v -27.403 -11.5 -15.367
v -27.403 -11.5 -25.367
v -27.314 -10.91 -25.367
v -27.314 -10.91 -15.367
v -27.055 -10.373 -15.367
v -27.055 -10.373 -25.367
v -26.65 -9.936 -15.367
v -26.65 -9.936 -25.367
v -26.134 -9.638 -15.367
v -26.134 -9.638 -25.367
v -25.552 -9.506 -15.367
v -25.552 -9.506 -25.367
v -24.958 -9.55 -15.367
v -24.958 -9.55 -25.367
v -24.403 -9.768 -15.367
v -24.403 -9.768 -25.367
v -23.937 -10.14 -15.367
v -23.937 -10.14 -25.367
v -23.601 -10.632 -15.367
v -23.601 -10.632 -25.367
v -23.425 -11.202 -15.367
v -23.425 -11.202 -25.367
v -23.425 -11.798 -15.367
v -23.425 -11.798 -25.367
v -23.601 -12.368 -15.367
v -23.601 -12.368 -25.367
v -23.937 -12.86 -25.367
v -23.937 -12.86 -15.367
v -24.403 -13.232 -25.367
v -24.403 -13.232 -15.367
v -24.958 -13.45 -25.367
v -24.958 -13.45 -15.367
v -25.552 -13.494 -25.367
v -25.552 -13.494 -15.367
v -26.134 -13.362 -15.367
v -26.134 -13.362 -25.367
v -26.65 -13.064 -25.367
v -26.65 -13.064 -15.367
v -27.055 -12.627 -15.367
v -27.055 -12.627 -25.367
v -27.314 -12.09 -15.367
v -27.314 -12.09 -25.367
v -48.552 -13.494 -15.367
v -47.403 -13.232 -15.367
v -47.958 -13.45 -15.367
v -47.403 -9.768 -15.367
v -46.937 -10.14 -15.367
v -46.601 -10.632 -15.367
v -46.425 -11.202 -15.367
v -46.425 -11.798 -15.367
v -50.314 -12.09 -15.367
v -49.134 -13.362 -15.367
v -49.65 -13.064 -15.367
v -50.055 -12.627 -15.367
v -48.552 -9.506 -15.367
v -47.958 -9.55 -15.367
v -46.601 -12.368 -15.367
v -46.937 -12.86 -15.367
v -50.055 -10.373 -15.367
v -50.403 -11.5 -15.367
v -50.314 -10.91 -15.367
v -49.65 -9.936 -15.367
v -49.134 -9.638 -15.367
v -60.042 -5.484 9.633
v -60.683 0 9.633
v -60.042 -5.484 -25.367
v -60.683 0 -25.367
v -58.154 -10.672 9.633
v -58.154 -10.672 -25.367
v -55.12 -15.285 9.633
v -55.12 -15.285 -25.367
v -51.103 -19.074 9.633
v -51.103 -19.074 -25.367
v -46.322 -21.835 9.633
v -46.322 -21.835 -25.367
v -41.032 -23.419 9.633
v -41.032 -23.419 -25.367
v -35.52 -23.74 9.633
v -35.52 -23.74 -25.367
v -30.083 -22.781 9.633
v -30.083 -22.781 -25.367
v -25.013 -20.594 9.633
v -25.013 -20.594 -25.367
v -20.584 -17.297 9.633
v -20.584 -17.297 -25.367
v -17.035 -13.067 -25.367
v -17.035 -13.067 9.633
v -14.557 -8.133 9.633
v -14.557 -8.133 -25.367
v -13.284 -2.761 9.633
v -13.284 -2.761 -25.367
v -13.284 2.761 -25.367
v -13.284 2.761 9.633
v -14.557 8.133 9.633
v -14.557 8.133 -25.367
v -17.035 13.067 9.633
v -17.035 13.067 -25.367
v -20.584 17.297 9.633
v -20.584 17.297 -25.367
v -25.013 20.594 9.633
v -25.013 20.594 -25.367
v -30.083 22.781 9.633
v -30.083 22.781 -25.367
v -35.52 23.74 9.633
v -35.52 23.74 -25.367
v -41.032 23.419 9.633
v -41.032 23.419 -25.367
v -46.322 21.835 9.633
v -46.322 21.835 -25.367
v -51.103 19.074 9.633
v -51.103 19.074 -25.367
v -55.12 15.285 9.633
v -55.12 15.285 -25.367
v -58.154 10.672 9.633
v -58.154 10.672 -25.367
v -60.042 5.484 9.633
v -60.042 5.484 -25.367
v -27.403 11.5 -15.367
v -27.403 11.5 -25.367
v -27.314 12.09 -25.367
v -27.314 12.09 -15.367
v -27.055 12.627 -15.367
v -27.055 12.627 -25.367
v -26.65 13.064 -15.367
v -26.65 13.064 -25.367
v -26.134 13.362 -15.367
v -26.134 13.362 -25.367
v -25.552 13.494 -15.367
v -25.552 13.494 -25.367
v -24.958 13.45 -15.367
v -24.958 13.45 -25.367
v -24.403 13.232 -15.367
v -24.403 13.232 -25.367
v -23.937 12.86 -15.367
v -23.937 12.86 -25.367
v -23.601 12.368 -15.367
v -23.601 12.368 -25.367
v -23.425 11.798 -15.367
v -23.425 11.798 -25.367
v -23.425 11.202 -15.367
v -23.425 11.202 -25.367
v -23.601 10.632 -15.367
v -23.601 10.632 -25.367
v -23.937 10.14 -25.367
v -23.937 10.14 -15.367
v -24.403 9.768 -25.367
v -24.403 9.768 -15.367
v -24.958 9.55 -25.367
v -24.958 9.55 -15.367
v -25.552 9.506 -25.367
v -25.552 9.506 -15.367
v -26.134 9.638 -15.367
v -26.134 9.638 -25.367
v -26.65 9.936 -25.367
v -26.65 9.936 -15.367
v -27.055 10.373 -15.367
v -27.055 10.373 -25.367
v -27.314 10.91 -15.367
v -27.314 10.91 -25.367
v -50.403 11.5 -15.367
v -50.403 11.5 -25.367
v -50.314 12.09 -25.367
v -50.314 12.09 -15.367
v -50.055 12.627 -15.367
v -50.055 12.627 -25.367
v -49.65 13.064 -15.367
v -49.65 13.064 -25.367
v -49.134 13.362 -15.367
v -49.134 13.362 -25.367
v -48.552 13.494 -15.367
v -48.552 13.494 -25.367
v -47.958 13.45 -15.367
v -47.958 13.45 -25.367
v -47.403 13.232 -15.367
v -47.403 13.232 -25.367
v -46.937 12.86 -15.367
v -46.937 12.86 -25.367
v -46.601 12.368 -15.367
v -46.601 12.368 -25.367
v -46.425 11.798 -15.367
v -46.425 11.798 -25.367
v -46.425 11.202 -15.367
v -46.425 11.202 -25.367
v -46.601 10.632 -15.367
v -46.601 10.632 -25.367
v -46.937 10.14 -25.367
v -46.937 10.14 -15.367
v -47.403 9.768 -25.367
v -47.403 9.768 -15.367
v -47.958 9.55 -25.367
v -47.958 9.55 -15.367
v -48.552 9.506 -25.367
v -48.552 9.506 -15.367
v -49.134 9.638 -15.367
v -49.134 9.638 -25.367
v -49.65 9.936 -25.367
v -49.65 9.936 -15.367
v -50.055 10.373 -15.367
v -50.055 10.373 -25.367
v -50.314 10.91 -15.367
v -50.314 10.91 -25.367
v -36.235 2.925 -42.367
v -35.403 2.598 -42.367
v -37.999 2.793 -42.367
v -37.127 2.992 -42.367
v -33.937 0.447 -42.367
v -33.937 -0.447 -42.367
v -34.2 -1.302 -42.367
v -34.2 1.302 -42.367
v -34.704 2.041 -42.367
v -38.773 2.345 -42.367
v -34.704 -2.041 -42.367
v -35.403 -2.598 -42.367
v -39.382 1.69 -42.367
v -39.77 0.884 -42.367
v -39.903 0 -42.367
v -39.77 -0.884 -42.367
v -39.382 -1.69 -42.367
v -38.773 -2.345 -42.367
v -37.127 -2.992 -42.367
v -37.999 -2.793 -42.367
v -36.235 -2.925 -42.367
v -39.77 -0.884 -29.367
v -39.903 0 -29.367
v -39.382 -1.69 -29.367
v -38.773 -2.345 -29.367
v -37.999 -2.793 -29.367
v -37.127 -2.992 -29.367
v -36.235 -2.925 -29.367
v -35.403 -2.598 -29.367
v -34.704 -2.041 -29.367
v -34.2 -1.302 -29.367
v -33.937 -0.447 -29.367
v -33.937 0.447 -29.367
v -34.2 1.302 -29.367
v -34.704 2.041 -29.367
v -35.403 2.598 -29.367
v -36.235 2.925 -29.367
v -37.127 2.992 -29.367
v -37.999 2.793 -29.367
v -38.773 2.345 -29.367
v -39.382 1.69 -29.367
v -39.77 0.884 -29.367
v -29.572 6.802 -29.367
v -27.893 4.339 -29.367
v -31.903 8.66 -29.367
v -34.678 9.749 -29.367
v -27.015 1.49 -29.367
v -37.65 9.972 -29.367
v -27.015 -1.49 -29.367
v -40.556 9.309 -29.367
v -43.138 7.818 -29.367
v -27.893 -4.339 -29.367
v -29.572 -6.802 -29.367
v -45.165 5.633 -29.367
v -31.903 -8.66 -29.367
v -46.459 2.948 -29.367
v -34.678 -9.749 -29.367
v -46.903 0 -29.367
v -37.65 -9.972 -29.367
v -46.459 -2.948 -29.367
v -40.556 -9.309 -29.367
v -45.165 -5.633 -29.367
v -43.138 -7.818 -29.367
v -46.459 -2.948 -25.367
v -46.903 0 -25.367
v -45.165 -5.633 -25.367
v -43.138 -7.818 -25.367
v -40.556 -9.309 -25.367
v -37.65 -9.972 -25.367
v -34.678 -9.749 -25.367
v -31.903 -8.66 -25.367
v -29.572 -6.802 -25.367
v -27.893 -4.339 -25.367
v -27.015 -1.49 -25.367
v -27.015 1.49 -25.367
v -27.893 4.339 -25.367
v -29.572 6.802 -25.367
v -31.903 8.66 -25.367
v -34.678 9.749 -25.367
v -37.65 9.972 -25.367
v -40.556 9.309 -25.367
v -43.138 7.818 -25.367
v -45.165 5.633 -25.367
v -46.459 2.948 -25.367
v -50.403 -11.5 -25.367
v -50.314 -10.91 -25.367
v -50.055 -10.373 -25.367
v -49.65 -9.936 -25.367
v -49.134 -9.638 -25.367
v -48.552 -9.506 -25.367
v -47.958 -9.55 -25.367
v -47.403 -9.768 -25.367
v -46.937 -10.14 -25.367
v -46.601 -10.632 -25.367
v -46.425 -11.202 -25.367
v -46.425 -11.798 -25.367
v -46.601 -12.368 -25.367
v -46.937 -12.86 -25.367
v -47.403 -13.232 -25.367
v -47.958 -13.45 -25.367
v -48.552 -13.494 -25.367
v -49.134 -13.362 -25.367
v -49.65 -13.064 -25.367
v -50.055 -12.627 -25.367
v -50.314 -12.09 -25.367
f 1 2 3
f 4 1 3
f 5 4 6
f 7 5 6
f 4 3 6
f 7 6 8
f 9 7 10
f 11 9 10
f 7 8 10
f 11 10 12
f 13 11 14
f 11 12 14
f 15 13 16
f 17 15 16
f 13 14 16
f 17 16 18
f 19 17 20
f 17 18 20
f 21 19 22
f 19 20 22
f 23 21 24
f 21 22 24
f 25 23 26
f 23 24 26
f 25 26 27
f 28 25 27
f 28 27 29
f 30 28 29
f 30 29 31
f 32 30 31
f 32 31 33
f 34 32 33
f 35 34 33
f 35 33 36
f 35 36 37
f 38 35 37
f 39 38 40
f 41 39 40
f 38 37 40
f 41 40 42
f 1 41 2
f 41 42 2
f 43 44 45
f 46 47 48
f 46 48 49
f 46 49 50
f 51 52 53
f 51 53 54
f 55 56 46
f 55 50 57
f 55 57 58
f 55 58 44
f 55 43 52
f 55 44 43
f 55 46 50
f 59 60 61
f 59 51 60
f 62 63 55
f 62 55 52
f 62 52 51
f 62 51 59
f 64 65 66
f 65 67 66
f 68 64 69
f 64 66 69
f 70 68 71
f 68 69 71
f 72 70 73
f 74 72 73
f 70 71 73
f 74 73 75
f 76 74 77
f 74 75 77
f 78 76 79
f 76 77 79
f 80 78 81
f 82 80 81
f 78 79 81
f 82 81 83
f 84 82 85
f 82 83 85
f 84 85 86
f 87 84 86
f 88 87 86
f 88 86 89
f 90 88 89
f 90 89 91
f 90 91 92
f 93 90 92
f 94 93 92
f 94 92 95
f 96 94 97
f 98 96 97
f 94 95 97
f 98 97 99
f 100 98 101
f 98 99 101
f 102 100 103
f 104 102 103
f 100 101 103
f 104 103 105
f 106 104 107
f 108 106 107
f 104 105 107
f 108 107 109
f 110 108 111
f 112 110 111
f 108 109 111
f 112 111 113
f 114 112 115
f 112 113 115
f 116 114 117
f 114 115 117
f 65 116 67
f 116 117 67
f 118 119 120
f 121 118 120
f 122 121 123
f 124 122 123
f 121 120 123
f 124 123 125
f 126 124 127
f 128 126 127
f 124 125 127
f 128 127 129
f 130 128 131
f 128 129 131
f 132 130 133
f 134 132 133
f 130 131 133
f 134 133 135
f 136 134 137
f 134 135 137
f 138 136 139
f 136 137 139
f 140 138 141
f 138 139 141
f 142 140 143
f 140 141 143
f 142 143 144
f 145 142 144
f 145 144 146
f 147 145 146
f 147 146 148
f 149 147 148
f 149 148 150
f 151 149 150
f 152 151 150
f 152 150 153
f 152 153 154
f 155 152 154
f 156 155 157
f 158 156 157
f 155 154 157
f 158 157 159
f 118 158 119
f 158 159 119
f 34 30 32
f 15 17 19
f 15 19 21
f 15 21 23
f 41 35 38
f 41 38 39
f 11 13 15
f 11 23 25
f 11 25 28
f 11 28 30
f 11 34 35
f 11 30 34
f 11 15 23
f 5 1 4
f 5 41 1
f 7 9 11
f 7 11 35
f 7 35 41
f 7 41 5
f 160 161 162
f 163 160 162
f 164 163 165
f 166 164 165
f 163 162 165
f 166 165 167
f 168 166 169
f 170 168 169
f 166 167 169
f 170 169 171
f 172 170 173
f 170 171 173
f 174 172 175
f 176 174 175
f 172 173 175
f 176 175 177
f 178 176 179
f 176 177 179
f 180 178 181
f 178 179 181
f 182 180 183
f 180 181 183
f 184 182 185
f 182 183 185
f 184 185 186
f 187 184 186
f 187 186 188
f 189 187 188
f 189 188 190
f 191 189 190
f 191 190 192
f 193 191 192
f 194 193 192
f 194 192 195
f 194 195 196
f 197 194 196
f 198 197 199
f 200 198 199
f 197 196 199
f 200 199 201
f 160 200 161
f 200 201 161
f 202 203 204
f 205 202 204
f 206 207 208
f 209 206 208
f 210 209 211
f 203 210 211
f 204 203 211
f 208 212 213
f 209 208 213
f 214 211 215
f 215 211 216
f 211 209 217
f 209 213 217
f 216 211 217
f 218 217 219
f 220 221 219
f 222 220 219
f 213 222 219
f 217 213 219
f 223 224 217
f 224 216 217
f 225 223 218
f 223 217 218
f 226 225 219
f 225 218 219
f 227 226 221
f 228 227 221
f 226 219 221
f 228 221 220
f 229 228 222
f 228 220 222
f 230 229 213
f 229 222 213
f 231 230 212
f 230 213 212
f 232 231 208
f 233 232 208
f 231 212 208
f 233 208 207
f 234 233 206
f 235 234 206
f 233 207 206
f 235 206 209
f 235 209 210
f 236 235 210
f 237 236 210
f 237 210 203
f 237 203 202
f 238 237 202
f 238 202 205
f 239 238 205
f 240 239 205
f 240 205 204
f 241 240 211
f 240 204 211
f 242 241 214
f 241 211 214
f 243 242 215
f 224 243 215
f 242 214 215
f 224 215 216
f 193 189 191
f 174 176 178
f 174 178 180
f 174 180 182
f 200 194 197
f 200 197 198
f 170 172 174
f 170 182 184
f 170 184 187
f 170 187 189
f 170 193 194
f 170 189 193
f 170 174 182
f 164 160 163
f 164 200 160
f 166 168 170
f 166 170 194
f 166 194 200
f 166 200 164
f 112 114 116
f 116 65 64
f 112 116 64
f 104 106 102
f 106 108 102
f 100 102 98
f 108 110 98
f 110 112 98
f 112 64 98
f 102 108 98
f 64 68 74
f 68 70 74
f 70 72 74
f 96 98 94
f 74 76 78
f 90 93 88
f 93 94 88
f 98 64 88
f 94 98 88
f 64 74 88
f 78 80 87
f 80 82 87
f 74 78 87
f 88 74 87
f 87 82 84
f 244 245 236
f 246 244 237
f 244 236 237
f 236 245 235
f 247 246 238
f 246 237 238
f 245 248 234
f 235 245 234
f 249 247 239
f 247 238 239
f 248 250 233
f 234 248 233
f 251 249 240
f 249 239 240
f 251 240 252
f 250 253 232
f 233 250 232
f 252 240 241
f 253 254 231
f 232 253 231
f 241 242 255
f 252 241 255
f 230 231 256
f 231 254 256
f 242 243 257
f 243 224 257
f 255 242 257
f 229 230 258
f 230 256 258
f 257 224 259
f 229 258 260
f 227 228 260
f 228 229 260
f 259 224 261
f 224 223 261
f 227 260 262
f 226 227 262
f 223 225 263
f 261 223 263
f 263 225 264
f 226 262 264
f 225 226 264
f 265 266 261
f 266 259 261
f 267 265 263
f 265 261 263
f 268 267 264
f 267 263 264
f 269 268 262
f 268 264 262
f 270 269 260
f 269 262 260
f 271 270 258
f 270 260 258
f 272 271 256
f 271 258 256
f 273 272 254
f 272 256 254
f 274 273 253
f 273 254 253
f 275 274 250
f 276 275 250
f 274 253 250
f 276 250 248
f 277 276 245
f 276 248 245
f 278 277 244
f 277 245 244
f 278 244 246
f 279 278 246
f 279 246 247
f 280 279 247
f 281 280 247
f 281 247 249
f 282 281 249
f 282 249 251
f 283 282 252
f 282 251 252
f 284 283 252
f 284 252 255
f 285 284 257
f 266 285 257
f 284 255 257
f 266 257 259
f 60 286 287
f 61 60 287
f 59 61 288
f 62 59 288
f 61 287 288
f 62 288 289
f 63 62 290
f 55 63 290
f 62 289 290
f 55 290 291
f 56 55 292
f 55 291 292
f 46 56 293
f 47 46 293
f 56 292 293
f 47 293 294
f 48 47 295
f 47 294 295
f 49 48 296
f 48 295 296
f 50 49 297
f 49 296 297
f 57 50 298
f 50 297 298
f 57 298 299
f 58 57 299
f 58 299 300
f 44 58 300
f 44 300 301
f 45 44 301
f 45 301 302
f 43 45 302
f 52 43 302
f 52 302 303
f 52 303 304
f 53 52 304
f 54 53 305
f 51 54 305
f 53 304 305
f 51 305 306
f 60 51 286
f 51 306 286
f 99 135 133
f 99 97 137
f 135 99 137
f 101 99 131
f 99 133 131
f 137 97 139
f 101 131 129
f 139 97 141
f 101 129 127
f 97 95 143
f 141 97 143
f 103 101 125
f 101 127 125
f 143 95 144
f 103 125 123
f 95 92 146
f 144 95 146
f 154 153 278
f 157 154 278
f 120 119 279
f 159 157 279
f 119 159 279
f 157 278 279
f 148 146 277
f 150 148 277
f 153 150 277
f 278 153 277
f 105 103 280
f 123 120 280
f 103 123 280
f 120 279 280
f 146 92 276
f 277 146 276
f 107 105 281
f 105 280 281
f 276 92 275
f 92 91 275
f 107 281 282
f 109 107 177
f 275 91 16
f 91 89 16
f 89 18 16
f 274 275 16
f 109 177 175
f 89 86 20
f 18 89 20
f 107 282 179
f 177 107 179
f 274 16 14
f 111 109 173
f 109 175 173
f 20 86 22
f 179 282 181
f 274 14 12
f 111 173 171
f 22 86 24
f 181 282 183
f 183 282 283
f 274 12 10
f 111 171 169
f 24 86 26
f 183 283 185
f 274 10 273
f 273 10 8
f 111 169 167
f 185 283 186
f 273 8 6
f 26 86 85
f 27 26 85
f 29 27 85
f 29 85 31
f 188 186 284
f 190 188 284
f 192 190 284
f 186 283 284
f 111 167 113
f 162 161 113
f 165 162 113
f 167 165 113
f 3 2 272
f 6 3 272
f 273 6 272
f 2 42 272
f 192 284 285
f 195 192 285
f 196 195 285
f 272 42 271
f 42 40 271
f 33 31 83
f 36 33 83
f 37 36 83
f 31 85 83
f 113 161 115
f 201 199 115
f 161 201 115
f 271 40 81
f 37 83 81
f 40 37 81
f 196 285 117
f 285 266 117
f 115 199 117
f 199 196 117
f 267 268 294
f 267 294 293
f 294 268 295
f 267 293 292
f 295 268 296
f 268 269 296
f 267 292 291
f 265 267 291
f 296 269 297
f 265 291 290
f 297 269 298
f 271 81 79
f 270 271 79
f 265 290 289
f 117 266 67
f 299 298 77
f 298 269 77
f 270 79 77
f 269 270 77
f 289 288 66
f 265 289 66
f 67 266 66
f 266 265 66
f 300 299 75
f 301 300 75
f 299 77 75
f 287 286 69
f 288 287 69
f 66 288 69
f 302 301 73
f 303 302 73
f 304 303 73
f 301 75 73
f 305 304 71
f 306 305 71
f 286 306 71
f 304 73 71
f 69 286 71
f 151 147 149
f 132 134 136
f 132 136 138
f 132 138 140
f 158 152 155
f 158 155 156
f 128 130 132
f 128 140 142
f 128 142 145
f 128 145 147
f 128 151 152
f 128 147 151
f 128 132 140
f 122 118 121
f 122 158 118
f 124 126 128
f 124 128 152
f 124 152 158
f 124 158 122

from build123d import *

# Parameters (mm, degrees)
SKETCH2_R          = 2
CUT_EXTRUDE1_DEPTH = 10


with BuildPart() as part:
    # Sketch1 → Revolve1 (revolve)
    with BuildSketch(Plane(origin=(0, 0, 0), x_dir=(1, 0, 0), z_dir=(0, 1, 0)), mode=Mode.PRIVATE) as revolve1_sk:
        Polygon((-36.90300646, -9.632836954), (-13.12300646, -9.632836954), (-13.12300646, 25.367163046), (-26.90300646, 25.367163046), (-26.90300646, 29.367163046), (-33.90300646, 29.367163046), (-33.90300646, 42.367163046), (-36.90300646, 42.367163046), align=None)
    revolve(revolve1_sk.sketch.rotate(Axis((-36.90300646, 0, -63.116337875), (0, 0, 1)), 180), axis=Axis((-36.90300646, 0, -63.116337875), (0, 0, 1)))

    # Sketch2 → Cut-Extrude1 (cut)
    with BuildSketch(Plane(origin=(0, 0, -25.367163046), x_dir=(-1, 0, 0), z_dir=(0, 0, -1))):
        with Locations((25.40300646, 11.5)):
            Circle(SKETCH2_R)
        with Locations((48.40300646, 11.5)):
            Circle(SKETCH2_R)
        with Locations((48.40300646, -11.5)):
            Circle(SKETCH2_R)
        with Locations((25.40300646, -11.5)):
            Circle(SKETCH2_R)
    extrude(amount=-CUT_EXTRUDE1_DEPTH, mode=Mode.SUBTRACT)


solid = part.part
